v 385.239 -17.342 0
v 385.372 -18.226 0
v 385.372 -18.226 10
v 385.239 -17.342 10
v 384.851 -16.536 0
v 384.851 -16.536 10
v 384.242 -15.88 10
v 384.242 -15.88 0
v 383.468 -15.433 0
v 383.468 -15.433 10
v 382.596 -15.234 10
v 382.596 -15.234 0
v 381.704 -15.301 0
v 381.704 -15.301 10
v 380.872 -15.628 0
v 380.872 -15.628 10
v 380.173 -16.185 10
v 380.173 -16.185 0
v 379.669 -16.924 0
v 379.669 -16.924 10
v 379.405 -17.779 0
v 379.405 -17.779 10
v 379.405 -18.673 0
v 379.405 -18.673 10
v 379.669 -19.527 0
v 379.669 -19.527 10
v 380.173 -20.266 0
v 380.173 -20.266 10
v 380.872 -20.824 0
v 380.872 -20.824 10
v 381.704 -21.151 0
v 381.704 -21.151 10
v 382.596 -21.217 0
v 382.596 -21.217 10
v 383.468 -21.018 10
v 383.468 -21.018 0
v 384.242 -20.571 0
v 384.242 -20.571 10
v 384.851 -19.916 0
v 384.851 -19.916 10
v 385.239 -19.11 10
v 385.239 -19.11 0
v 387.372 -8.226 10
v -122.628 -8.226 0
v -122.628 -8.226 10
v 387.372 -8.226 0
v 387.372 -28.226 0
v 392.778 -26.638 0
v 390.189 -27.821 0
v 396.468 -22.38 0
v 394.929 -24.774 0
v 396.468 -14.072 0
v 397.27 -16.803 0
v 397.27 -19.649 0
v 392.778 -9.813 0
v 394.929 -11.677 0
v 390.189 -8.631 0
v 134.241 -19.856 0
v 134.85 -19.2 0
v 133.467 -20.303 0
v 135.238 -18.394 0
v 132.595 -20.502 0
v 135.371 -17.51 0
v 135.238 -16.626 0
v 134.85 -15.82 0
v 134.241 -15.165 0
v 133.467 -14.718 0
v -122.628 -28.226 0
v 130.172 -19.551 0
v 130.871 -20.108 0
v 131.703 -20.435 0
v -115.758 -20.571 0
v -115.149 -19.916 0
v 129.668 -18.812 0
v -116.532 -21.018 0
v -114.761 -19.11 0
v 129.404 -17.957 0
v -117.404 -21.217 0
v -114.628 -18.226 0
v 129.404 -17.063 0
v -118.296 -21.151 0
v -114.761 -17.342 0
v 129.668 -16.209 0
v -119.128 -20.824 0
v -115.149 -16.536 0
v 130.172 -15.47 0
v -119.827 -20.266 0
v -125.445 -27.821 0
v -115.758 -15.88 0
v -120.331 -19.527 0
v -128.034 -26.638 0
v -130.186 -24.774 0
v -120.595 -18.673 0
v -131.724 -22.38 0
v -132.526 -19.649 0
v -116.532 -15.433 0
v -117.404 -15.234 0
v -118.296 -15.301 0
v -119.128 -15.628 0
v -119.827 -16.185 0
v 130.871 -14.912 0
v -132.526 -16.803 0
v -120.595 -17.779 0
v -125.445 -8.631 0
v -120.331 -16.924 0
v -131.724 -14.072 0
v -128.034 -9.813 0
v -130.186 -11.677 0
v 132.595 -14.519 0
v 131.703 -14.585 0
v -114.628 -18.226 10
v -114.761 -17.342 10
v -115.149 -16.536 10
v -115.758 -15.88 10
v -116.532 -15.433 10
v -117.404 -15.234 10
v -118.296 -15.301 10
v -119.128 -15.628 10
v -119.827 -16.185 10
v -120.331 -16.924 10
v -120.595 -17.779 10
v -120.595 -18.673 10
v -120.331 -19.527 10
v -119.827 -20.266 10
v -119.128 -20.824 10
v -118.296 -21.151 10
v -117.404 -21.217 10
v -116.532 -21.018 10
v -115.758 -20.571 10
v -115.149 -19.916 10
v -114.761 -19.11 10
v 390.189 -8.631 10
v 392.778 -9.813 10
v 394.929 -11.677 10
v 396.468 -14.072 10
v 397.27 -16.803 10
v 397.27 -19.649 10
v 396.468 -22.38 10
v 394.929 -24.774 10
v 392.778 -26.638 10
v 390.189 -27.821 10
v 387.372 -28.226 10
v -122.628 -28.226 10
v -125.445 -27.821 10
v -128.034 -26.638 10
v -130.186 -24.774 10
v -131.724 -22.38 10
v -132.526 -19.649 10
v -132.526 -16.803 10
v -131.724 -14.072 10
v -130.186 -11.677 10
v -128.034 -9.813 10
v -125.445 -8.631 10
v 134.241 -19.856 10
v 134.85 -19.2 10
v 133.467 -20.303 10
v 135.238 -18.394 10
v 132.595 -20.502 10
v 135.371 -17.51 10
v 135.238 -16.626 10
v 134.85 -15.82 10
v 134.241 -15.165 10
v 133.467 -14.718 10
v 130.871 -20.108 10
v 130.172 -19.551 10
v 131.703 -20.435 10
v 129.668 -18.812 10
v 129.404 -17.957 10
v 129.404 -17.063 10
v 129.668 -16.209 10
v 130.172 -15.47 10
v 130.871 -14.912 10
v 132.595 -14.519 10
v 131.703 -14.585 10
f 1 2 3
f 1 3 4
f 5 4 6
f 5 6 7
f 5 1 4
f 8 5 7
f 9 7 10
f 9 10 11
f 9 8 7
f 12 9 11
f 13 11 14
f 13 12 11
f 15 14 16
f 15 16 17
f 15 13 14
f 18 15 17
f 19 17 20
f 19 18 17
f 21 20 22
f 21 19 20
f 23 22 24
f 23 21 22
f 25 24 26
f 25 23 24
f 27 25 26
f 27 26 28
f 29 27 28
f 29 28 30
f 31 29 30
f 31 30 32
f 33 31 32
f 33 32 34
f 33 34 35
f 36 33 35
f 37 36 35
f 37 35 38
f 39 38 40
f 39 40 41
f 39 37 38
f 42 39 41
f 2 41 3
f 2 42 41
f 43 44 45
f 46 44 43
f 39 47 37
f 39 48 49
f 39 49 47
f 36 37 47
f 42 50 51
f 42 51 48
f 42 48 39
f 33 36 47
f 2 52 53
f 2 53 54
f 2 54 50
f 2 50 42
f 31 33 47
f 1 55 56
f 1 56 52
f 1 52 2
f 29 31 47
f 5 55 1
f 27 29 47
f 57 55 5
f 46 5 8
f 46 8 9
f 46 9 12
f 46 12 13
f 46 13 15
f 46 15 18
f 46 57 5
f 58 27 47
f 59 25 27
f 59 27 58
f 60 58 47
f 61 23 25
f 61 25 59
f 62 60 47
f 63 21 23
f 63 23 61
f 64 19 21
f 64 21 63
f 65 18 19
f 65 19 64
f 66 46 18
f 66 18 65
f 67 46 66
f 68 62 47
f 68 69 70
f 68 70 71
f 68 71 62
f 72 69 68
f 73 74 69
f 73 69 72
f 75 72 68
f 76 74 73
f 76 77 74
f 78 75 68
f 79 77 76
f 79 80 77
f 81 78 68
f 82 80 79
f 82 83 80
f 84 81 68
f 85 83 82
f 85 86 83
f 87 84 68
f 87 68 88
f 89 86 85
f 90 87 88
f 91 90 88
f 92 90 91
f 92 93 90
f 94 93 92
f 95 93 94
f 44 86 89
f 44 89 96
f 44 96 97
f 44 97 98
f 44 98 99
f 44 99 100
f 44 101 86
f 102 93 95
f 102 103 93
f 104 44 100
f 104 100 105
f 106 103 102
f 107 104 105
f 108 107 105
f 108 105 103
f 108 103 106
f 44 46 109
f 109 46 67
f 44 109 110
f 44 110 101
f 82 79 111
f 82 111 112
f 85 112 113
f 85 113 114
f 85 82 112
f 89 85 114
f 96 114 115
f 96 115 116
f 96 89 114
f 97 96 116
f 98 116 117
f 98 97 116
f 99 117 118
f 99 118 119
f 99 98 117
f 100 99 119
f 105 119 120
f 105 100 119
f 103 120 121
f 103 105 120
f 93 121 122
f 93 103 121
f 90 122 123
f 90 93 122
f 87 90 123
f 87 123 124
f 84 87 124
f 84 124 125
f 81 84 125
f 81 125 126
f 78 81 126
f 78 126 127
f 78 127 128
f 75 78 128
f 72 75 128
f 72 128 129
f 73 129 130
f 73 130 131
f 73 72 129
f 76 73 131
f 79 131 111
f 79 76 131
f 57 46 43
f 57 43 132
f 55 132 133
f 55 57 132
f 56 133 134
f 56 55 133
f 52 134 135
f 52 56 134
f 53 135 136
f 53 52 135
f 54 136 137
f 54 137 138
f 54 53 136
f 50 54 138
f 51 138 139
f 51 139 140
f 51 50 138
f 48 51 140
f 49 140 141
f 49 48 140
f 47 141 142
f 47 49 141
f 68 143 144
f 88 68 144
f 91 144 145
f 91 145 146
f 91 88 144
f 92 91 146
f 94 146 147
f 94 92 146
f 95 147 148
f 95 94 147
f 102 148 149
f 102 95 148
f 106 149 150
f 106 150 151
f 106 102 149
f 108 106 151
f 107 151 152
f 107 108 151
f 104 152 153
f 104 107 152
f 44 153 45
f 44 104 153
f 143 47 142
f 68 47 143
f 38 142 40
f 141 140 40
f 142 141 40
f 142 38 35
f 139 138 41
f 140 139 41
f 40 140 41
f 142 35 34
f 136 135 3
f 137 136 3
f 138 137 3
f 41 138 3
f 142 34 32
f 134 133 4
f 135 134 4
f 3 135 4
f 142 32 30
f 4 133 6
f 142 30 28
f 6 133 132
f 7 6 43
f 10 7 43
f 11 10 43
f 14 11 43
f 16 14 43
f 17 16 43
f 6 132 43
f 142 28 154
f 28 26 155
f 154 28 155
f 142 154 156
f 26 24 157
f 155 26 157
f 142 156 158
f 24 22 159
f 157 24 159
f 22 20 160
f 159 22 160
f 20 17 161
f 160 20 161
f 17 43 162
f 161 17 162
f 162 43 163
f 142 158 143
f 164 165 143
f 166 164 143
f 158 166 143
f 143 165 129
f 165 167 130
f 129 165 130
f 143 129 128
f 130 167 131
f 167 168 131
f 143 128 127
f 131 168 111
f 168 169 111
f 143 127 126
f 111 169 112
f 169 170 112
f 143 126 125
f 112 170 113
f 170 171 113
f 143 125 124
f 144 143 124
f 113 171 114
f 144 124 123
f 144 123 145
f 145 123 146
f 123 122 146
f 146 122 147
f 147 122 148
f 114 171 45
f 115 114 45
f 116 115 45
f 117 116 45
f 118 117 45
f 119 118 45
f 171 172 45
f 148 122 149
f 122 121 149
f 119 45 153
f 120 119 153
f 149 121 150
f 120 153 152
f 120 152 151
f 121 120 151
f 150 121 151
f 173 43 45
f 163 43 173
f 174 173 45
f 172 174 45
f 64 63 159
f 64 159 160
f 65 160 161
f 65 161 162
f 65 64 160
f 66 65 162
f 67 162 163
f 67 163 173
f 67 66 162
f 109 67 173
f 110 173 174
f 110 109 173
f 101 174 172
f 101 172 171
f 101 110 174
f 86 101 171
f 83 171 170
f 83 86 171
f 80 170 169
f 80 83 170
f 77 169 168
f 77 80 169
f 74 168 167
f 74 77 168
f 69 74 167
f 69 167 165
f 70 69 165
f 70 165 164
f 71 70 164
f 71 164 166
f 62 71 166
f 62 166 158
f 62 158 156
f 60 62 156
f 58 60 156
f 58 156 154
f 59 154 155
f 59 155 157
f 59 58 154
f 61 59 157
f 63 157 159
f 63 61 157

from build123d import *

# Parameters (mm, degrees)
ESQUISSE1_R             = 3
BOSS_EXTRU_1_DEPTH      = 10
ENL_V_START             = -10
ESQUISSE2_R             = 3
ENL_V_MAT_EXTRU_1_DEPTH = 10


with BuildPart() as part:
    # Esquisse1 → Boss.-Extru.1 (new body)
    with BuildSketch(Plane.XY):
        with BuildLine():
            Line((-122.628083491, -8.225806452), (387.371916509, -8.225806452))
            ThreePointArc((387.371916509, -8.225806452), (397.371916509, -18.225806452), (387.371916509, -28.225806452))
            Line((387.371916509, -28.225806452), (-122.628083491, -28.225806452))
            ThreePointArc((-122.628083491, -28.225806452), (-132.628083491, -18.225806452), (-122.628083491, -8.225806452))
        make_face()
        with Locations((-117.628083491, -18.225806452)):
            Circle(ESQUISSE1_R, mode=Mode.SUBTRACT)
        with Locations((382.371916509, -18.225806452)):
            Circle(ESQUISSE1_R, mode=Mode.SUBTRACT)
    extrude(amount=BOSS_EXTRU_1_DEPTH)

    # Esquisse2 → Enlèv. mat.-Extru.1 (cut)
    with BuildSketch(Plane.XY.offset(10).offset(ENL_V_START)):
        with Locations((132.370892359, -17.510213181)):
            Circle(ESQUISSE2_R)
        with Locations((-117.628083491, -18.225806452)):
            Circle(ESQUISSE2_R)
    extrude(amount=ENL_V_MAT_EXTRU_1_DEPTH, mode=Mode.SUBTRACT)


solid = part.part
